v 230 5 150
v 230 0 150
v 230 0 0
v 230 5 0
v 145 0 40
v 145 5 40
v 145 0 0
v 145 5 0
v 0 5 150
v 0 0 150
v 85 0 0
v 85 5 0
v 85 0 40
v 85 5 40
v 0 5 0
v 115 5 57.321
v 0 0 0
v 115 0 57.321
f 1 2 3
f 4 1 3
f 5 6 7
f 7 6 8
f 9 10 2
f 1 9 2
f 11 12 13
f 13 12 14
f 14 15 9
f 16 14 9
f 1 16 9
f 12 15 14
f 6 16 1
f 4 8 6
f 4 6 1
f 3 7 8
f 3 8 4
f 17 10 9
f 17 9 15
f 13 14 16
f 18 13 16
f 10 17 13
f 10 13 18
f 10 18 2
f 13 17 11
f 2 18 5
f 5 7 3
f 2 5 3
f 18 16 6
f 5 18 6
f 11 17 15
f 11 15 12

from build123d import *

# Parameters (mm, degrees)
SKETCH1_W           = 230
SKETCH1_H           = 150
BOSS_EXTRUDE1_DEPTH = 5
CUT_EXTRUDE1_DEPTH  = 275.636122897


with BuildPart() as part:
    # Sketch1 → Boss-Extrude1 (new body)
    with BuildSketch(Plane(origin=(0, 0, 0), x_dir=(1, 0, 0), z_dir=(0, 1, 0))):
        with Locations((115, -75)):
            Rectangle(SKETCH1_W, SKETCH1_H)
    extrude(amount=BOSS_EXTRUDE1_DEPTH)

    # Sketch2 → Cut-Extrude1 (cut, through all)
    with BuildSketch(Plane(origin=(0, 5, 0), x_dir=(1, 0, 0), z_dir=(0, 1, 0))):
        Polygon((145, 0), (85, 0), (85, -40), (115, -57.320508076), (145, -40), align=None)
    extrude(amount=-CUT_EXTRUDE1_DEPTH, mode=Mode.SUBTRACT)


solid = part.part
